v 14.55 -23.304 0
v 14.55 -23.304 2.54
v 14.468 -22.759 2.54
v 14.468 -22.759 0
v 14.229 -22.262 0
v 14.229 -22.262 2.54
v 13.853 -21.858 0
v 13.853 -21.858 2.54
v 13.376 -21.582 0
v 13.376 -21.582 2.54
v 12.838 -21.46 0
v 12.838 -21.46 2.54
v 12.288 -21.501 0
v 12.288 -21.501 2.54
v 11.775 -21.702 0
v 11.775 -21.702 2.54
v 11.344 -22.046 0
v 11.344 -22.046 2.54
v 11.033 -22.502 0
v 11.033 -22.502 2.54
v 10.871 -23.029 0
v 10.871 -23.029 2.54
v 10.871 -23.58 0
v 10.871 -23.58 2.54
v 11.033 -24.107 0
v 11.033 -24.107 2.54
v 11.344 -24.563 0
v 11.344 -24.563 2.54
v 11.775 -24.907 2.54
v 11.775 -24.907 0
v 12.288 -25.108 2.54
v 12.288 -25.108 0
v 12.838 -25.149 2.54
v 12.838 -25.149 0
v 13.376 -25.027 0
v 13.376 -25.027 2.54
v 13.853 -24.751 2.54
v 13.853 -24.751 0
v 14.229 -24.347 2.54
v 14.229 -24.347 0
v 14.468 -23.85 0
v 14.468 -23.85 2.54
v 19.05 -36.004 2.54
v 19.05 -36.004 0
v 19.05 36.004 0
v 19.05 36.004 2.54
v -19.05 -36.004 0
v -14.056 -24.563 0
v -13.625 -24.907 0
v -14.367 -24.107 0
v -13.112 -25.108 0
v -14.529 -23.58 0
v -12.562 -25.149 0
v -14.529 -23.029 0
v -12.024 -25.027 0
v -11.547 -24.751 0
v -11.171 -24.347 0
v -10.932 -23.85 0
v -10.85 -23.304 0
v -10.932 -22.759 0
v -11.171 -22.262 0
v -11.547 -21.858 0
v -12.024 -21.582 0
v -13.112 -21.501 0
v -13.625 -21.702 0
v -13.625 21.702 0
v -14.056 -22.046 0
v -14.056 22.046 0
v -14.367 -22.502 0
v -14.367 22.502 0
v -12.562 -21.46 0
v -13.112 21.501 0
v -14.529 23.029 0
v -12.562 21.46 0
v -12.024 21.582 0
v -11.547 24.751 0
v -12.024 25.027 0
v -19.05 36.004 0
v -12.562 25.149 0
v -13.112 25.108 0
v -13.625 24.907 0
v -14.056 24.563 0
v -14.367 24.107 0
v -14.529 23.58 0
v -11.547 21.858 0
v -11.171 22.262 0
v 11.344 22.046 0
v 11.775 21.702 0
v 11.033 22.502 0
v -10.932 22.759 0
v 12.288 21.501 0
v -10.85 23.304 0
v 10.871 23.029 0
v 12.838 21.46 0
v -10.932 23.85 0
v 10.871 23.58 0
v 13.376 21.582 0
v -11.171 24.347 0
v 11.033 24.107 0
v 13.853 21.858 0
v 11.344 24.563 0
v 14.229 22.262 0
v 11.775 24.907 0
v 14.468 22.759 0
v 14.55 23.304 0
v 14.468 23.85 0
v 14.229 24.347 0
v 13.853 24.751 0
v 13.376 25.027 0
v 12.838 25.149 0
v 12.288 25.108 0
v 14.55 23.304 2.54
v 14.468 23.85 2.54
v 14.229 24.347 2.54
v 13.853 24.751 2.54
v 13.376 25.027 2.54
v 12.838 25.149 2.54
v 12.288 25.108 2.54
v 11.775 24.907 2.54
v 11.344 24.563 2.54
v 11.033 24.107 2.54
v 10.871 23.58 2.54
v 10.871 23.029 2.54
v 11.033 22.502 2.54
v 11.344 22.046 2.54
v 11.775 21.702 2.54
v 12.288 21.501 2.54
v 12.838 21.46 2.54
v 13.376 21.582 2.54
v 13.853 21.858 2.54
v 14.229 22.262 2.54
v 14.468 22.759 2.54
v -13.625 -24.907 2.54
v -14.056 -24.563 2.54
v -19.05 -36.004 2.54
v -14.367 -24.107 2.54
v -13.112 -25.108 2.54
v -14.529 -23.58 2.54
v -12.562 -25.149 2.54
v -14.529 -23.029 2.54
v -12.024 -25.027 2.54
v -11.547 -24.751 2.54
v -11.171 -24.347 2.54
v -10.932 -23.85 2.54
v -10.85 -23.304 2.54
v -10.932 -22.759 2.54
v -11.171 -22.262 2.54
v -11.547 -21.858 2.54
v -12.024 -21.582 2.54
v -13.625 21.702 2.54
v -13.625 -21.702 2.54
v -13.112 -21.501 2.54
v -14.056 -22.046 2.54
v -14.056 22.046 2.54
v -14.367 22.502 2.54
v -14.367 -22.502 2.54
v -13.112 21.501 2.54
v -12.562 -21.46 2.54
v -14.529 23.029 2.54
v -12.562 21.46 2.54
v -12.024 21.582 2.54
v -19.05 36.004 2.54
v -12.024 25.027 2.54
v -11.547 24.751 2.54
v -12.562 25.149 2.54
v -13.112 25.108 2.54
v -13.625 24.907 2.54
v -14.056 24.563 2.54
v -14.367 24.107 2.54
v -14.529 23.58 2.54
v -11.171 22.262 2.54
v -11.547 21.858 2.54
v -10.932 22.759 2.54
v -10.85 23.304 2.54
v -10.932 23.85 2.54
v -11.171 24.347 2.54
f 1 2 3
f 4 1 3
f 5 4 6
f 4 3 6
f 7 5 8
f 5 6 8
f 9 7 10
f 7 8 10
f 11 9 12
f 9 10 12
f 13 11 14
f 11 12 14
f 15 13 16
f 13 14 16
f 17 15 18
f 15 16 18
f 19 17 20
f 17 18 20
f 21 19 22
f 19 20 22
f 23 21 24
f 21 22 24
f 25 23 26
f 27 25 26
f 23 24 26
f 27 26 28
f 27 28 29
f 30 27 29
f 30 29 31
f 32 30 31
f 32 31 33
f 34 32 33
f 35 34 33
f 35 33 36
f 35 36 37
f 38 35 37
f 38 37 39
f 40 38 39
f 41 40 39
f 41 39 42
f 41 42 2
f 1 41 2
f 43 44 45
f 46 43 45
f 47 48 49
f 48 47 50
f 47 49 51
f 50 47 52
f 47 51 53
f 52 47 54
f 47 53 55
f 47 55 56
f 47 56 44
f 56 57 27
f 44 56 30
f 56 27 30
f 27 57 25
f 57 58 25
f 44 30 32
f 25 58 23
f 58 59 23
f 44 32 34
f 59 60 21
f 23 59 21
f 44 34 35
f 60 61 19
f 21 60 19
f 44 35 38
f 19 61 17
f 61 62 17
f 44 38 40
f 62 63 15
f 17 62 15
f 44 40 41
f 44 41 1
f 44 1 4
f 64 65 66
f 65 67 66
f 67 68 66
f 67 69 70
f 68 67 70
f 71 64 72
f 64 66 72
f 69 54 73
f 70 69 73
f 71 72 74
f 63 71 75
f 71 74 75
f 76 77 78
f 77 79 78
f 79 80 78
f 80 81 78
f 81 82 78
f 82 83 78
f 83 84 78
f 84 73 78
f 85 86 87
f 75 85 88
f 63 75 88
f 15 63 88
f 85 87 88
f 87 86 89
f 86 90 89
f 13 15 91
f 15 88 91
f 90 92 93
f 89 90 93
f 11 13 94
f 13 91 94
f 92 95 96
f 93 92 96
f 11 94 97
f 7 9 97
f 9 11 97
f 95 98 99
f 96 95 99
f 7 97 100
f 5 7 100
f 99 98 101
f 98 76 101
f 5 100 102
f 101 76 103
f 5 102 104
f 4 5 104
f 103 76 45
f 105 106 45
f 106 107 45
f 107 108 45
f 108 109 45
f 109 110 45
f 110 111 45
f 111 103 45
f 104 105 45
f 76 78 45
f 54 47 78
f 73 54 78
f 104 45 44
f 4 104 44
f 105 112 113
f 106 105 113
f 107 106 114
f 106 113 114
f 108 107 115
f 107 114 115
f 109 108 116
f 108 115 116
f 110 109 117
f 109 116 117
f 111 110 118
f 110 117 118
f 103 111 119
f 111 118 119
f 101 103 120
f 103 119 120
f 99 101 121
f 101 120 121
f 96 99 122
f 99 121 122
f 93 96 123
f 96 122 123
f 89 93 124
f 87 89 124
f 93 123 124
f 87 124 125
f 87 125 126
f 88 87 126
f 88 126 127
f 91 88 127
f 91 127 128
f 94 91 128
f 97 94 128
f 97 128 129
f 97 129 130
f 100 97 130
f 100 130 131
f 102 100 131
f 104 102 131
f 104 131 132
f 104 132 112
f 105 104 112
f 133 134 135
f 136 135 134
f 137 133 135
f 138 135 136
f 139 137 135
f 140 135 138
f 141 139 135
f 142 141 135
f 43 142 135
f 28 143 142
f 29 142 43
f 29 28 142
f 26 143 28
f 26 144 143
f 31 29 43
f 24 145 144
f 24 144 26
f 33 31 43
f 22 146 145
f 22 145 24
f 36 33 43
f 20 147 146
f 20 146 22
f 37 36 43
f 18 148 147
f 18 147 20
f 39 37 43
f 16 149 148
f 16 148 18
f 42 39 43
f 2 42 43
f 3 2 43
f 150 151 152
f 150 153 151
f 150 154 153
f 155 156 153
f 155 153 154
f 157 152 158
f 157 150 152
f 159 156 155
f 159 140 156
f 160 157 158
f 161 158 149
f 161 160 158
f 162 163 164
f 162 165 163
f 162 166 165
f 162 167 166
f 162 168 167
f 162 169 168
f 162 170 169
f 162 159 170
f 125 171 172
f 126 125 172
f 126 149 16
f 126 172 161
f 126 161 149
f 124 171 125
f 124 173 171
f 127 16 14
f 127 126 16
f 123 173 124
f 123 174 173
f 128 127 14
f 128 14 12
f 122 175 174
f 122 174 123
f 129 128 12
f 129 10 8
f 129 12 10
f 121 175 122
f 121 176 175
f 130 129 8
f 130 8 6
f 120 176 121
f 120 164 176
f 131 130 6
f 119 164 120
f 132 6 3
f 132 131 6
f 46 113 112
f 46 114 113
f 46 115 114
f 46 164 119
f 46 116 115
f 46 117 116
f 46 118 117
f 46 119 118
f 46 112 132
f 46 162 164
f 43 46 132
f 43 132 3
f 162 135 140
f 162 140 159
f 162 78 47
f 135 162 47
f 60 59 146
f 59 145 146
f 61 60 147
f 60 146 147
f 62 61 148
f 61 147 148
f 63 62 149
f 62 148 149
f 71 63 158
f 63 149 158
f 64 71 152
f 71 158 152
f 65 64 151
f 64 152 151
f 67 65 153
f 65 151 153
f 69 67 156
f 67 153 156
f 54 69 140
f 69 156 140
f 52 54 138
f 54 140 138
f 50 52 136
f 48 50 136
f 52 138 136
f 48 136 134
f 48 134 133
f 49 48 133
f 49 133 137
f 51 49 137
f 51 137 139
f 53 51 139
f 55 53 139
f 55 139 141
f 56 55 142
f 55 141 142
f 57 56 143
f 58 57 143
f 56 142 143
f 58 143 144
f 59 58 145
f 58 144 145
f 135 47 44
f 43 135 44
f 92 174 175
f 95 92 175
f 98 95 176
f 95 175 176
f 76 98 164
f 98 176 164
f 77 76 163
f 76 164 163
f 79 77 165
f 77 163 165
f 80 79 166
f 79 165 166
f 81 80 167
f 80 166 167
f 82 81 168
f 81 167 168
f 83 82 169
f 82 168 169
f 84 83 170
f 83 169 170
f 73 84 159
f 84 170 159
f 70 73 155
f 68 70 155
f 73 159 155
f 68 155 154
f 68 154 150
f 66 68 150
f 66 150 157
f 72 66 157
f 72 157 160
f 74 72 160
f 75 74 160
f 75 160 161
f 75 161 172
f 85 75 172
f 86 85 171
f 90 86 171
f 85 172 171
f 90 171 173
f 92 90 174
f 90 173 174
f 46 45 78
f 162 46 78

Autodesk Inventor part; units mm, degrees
ref_plane "YZ Plane" through (0, 0, 0) normal (1, 0, 0) x (0, 1, 0)
ref_plane "XZ Plane" through (0, 0, 0) normal (0, 1, 0) x (-1, 0, 0)
ref_plane "XY Plane" through (0, 0, 0) normal (0, 0, 1) x (1, 0, 0)
sketch "Sketch1" plane through (0, 0, 0) normal (0, 0, 1) x (1, 0, 0)
  line L0 (-19.05, -36.0045) -> (19.05, -36.0045)
  line L1 (19.05, -36.0045) -> (19.05, 36.0045)
  line L2 (19.05, 36.0045) -> (-19.05, 36.0045)
  line L3 (-19.05, 36.0045) -> (-19.05, -36.0045)
  line L4 (-19.05, -36.0045) -> (19.05, 36.0045) construction
  line L5 (19.05, -36.0045) -> (-19.05, 36.0045) construction
  point P0 (0, 0)
  dimension "d0" = 38.1
  dimension "d1" = 72.009
extrude "Extrusion1" add sketch "Sketch1" along normal blind 2.54
sketch "Sketch2" plane through (0, 0, 2.54) normal (0, 0, 1) x (1, 0, 0)
  circle A0 centre (-12.7, 23.3045) radius 1.85 projected
  circle A1 centre (12.7, 23.3045) radius 1.85 projected
  circle A2 centre (-12.7, -23.3045) radius 1.85 projected
  circle A3 centre (12.7, -23.3045) radius 1.85 projected
  point P0 (0, 0)
extrude "Extrusion2" cut sketch "Sketch2" against normal blind 2.54
properties part number "GearPlate"
